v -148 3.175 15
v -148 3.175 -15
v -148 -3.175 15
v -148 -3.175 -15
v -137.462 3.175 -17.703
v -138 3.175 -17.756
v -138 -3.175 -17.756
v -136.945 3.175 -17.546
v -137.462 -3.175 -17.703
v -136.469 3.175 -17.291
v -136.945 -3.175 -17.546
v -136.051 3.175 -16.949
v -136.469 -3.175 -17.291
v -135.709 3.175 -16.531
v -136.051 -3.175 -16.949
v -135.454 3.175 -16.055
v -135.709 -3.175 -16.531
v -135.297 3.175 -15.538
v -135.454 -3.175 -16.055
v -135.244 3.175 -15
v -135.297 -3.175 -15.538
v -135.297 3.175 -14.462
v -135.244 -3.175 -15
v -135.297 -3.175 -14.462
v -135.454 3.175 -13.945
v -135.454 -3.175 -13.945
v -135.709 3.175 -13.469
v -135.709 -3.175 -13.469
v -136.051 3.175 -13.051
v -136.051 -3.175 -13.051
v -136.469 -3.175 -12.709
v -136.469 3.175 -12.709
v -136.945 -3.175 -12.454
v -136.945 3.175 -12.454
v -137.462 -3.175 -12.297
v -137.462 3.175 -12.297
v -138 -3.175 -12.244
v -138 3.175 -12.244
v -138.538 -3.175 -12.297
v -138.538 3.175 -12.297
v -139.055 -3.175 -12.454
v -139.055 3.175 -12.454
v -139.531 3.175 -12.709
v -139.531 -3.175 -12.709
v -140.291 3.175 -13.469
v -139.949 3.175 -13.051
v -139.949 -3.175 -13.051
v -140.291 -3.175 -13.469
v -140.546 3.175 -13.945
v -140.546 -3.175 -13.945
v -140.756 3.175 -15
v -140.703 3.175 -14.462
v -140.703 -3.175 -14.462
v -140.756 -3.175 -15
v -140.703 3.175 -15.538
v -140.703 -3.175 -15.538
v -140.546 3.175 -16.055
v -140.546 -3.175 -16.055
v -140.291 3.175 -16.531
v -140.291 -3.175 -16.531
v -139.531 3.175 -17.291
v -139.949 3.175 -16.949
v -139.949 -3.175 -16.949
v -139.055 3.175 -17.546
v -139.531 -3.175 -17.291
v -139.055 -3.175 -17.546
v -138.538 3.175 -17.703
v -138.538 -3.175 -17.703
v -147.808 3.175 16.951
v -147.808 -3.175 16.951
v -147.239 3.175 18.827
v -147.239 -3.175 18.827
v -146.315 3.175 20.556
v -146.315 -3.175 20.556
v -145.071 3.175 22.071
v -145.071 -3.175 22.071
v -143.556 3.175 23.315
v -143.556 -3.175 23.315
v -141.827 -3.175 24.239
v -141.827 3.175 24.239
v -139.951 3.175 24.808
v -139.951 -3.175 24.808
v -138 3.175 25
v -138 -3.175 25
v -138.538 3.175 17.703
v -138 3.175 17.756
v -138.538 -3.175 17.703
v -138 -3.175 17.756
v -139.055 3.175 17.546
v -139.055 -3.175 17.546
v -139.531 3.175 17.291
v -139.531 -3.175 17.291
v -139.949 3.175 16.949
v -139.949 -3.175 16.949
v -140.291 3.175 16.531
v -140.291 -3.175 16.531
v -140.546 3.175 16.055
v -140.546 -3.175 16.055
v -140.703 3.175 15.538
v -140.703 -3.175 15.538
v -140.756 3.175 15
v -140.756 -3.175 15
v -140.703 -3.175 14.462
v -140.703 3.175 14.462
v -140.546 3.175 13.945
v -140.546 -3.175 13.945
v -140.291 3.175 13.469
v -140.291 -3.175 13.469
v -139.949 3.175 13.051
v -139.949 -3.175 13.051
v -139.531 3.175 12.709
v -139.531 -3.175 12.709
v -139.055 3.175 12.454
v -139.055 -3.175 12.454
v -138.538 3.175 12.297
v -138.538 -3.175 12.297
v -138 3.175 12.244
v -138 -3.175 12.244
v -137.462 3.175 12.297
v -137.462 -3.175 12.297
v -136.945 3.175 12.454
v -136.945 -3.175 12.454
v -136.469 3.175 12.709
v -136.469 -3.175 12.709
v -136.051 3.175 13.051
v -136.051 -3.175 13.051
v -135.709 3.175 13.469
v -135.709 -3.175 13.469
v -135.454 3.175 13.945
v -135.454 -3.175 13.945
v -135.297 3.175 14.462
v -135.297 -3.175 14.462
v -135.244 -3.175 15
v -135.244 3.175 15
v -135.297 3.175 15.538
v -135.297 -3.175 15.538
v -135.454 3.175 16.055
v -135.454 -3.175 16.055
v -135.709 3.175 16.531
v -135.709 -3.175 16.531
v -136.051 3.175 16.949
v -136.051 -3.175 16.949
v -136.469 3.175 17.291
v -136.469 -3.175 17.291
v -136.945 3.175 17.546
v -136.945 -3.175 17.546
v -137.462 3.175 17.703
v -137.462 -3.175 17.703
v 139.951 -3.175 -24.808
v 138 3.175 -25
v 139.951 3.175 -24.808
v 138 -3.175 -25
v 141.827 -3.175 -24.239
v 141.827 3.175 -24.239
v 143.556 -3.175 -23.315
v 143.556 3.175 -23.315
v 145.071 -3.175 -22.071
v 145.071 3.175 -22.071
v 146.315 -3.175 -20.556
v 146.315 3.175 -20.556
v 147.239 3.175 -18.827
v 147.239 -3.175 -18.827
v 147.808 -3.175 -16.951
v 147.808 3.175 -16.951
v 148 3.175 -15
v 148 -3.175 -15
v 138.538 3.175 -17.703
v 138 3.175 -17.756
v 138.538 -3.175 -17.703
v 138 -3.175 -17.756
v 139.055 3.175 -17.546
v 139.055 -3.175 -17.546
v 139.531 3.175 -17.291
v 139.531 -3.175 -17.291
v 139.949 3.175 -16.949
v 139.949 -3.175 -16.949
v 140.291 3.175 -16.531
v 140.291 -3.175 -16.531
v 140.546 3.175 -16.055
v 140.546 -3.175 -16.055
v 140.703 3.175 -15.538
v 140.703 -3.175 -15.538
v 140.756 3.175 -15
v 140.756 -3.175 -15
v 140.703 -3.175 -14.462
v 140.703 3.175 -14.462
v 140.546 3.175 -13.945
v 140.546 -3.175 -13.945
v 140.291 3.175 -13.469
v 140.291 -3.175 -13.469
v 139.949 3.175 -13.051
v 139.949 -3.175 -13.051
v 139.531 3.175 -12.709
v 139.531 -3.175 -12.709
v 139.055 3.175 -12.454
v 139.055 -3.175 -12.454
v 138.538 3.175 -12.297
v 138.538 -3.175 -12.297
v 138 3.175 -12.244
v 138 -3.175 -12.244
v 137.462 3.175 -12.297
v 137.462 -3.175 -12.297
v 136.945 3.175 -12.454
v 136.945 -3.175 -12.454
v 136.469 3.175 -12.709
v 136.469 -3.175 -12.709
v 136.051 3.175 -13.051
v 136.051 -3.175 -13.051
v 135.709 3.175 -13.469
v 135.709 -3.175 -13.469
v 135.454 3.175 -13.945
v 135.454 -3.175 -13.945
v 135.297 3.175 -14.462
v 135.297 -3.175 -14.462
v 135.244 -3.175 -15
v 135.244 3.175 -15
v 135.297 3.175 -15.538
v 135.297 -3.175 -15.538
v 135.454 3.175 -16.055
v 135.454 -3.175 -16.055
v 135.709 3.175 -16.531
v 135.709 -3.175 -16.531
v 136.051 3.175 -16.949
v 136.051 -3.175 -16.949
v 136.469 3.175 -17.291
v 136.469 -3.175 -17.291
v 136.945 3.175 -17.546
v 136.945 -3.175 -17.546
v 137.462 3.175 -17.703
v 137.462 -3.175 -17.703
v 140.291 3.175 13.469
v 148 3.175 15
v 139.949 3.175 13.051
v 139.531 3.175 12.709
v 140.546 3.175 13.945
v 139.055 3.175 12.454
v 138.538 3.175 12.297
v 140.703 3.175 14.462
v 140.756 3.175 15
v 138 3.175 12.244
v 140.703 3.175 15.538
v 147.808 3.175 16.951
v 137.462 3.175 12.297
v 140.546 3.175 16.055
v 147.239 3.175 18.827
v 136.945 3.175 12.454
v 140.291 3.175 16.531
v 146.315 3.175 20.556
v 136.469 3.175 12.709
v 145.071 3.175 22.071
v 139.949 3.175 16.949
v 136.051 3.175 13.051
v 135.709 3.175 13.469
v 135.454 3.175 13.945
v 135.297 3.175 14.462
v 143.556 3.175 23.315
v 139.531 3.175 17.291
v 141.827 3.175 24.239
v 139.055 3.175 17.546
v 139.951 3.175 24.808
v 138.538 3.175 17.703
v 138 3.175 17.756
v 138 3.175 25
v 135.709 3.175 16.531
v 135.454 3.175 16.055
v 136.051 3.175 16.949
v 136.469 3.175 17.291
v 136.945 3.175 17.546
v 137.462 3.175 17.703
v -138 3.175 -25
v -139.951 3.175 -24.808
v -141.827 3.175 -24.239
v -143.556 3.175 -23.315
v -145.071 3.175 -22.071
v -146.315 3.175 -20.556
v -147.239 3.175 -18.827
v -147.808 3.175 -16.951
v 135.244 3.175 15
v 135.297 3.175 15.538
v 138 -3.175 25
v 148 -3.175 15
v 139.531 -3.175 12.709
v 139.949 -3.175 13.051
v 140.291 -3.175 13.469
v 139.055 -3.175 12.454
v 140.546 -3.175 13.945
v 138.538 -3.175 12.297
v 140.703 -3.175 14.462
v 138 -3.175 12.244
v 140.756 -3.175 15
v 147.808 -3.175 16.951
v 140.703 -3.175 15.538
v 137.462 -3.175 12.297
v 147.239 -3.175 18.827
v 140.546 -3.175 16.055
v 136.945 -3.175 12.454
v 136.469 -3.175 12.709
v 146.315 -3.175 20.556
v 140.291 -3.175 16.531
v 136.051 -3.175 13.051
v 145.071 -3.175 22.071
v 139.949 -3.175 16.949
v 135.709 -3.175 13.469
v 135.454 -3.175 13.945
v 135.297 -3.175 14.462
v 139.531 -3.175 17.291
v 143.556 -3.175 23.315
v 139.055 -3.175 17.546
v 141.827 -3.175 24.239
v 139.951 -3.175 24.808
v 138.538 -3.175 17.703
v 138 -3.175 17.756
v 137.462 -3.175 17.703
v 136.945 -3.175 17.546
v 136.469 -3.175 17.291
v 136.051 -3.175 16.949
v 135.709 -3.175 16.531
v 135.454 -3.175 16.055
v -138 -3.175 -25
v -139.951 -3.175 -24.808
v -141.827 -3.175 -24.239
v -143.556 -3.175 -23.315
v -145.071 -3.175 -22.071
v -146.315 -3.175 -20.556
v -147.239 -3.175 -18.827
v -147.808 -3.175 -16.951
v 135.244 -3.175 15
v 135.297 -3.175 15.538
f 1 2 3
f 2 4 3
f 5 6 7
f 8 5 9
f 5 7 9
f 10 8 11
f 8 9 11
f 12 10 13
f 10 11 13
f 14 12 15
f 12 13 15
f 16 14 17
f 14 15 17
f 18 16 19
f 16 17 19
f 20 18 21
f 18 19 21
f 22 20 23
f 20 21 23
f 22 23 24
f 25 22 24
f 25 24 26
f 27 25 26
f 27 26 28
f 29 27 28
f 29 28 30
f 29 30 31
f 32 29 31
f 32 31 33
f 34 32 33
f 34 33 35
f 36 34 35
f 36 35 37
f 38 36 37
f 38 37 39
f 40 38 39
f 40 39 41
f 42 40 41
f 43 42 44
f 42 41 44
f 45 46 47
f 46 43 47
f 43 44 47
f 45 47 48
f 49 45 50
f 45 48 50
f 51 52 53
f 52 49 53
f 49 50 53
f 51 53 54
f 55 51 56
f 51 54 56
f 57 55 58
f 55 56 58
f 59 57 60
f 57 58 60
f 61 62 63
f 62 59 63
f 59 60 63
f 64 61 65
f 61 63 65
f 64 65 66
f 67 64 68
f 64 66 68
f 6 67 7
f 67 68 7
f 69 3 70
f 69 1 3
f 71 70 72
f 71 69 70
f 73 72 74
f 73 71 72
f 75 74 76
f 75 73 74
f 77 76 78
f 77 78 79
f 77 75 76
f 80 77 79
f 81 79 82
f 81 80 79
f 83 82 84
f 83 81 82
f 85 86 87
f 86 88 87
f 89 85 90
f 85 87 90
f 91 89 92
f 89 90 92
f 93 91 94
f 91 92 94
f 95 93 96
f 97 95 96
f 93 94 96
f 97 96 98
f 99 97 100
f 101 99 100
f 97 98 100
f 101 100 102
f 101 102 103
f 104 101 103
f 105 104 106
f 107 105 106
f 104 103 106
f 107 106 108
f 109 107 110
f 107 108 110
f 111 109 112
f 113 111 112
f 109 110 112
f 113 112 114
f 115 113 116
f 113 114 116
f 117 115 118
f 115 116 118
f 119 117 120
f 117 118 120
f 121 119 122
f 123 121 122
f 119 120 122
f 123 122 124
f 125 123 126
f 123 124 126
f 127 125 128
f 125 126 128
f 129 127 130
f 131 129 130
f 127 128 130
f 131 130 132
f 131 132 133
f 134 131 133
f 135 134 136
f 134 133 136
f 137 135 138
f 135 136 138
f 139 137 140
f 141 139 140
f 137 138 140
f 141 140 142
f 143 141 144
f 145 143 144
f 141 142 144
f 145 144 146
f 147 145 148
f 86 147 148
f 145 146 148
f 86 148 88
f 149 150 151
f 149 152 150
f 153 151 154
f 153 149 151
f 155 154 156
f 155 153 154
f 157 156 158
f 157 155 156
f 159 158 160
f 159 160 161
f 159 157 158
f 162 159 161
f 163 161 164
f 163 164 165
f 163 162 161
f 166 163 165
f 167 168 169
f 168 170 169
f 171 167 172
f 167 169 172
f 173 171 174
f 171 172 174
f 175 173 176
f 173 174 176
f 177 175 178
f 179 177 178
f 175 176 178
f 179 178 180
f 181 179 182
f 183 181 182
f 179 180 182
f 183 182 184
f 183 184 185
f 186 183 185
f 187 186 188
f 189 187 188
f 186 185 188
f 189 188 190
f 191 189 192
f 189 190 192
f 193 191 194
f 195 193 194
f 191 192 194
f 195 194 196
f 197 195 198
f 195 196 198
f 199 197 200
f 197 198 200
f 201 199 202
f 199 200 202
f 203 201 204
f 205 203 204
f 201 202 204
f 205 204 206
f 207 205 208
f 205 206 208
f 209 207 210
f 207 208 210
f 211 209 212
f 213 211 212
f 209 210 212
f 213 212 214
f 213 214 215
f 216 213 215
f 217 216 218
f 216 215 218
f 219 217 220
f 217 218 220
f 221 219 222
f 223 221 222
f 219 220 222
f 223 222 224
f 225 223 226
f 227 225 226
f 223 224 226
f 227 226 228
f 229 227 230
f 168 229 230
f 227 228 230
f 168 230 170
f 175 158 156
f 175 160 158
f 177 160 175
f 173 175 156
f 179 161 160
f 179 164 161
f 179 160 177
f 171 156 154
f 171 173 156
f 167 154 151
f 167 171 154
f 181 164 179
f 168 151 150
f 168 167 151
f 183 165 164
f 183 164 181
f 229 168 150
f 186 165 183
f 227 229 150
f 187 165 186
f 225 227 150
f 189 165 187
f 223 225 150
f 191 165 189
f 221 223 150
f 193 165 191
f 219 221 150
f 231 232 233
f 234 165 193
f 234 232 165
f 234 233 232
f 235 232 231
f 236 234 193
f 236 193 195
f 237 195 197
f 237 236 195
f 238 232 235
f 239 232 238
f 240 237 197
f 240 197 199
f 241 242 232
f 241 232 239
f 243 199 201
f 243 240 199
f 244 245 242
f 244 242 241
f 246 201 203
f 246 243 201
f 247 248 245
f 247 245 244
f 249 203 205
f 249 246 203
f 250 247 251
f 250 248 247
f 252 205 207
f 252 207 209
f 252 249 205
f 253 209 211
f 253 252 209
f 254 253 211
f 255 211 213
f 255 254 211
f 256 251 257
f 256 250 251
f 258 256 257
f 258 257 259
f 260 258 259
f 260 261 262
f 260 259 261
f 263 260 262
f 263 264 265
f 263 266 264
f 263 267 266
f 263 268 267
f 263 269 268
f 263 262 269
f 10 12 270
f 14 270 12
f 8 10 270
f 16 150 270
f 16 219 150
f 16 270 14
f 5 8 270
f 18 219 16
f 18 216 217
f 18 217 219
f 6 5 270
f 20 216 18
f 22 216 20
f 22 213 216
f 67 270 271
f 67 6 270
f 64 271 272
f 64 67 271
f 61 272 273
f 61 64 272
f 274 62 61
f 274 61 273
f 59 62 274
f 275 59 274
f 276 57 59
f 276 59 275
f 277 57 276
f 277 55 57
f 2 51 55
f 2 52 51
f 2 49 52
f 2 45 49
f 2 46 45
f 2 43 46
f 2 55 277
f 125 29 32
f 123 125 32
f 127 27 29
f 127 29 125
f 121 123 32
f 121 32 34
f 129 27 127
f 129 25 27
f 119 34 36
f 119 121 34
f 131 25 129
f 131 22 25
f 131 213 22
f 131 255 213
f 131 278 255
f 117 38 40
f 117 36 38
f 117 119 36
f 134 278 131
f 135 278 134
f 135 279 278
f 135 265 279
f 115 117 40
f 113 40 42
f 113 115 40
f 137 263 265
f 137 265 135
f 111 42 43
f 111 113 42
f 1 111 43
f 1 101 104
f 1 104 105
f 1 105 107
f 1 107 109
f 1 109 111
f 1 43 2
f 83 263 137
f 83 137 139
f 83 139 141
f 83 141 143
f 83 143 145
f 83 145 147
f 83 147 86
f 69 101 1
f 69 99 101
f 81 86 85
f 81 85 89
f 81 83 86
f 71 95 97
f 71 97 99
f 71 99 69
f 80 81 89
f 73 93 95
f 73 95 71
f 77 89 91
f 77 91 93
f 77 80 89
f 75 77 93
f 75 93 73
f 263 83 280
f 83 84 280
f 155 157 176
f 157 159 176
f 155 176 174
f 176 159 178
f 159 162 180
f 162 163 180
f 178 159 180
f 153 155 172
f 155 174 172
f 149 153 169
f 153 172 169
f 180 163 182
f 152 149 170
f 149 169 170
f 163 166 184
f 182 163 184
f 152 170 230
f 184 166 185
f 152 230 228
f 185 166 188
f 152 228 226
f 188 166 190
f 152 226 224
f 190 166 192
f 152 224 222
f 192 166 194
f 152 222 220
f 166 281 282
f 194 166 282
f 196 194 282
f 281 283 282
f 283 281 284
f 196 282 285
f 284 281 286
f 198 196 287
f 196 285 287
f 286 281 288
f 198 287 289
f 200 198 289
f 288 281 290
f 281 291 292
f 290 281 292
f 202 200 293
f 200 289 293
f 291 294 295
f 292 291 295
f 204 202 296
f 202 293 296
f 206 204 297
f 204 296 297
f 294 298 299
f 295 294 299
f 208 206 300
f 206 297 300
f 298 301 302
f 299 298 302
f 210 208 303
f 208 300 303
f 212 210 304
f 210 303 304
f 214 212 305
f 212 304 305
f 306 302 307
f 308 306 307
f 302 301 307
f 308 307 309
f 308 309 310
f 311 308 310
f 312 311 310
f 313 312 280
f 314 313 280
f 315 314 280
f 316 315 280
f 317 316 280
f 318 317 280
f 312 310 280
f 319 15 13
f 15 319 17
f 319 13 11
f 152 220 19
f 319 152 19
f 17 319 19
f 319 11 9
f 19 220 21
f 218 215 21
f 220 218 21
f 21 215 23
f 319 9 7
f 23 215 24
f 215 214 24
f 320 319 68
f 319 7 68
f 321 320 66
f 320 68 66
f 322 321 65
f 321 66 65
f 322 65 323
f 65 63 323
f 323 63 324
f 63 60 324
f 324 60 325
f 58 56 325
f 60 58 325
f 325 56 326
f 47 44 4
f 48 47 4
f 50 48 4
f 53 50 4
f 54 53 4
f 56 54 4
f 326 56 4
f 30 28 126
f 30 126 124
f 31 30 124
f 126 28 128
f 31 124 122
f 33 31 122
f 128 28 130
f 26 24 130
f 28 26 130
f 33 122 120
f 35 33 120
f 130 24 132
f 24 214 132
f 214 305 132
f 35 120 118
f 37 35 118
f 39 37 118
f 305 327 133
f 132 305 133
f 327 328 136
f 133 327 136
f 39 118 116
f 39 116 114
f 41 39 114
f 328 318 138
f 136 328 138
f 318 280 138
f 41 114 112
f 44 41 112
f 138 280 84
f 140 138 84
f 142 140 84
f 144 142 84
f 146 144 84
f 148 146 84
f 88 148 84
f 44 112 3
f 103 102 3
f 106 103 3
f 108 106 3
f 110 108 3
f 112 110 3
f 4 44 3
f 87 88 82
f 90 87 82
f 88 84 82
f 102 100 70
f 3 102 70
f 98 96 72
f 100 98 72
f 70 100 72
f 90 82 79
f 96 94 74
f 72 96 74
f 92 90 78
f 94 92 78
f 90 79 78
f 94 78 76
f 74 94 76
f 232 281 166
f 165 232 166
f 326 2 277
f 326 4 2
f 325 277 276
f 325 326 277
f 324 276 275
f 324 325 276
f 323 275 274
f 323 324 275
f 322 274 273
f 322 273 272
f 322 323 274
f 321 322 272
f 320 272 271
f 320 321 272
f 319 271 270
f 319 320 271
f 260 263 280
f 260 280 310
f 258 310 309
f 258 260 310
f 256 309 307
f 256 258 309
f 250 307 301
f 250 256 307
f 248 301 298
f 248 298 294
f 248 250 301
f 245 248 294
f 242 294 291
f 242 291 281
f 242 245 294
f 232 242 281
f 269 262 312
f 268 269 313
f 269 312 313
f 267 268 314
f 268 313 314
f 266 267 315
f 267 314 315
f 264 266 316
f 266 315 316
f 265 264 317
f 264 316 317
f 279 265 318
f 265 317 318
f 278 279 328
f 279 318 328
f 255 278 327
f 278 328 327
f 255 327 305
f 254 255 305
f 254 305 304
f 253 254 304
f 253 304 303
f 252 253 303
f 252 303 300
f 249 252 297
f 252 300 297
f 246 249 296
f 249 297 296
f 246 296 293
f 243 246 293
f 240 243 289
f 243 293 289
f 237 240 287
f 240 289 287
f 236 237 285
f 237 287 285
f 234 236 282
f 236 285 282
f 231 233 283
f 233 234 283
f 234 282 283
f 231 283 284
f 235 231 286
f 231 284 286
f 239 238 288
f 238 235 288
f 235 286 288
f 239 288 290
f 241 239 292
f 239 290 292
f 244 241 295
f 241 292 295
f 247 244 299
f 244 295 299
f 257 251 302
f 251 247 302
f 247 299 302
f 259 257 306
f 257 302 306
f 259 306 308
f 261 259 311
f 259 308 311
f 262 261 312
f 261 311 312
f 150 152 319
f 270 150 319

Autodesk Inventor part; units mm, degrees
ref_plane "YZ Plane" through (0, 0, 0) normal (1, 0, 0) x (0, 1, 0)
ref_plane "XZ Plane" through (0, 0, 0) normal (0, 1, 0) x (-1, 0, 0)
ref_plane "XY Plane" through (0, 0, 0) normal (0, 0, 1) x (1, 0, 0)
sketch "Sketch1" plane through (0, 0, 0) normal (0, 1, 0) x (-1, 0, 0)
  line L0 (148, 25) -> (-148, 25)
  line L1 (-148, 25) -> (-148, -25)
  line L2 (-148, -25) -> (148, -25)
  line L3 (148, -25) -> (148, 25)
  line L4 (148, 25) -> (-148, -25) construction
  line L5 (-148, 25) -> (148, -25) construction
  point P0 (0, 0)
  dimension "d0" = 296
  dimension "d1" = 50
extrude "Extrusion1" add sketch "Sketch1" along normal mid plane 6.35
fillet "Fillet1" radius 10 4 edges at (-148, 0, 25) (-148, 0, -25) (148, 0, -25) (148, 0, 25)
sketch "Sketch2" plane through (0, 3.175, 0) normal (0, 1, 0) x (1, 0, 0)
  arc A0 (138, -25) -> (148, -15) centre (138, -15) ccw projected
  line L0 (138, 25) -> (-138, 25) projected
  arc A1 (-138, 25) -> (-148, 15) centre (-138, 15) ccw projected
  line L1 (-138, -25) -> (138, -25) projected
  line L2 (148, -15) -> (148, 15) projected
  arc A2 (148, 15) -> (138, 25) centre (138, 15) ccw projected
  line L3 (-148, 15) -> (-148, -15) projected
  arc A3 (-148, -15) -> (-138, -25) centre (-138, -15) ccw projected
  point P0 (0, 0)
  dimension "d6" = 10
  dimension "d14" = 10
hole "Hole1" at (-138, 3.175, 15) direction (0, -1, 0) diameter 5.5118 end through all clearance for "Socket Head Cap Screw" size "M5" standard "Ansi Metric M Profile"
mirror "Mirror1" about plane through (0, 0, 0) normal (0, 0, 1) of "Hole1"
mirror "Mirror2" about plane through (0, 0, 0) normal (1, 0, 0) of "Hole1", "Mirror1"
equation "\"d1\" = supportPlateWidth"
equation "\"d2\" = supportPlateThickness"
equation "\"d4\" = supportPlateFillet"
equation "\"supportPlateThickness\" = 6.35"
equation "\"supportPlateWidth\" = 50"
equation "\"plateFillet\" = 12.7"
equation "\"supportplateFillet\" = 12.7"
equation "\"separation\" = 35"
equation "\"centerVerticalRatio\" = 0.3"
equation "\"supportPlateFillet\" = 10"
properties part number "supportPlate" material "ABS Plastic"
